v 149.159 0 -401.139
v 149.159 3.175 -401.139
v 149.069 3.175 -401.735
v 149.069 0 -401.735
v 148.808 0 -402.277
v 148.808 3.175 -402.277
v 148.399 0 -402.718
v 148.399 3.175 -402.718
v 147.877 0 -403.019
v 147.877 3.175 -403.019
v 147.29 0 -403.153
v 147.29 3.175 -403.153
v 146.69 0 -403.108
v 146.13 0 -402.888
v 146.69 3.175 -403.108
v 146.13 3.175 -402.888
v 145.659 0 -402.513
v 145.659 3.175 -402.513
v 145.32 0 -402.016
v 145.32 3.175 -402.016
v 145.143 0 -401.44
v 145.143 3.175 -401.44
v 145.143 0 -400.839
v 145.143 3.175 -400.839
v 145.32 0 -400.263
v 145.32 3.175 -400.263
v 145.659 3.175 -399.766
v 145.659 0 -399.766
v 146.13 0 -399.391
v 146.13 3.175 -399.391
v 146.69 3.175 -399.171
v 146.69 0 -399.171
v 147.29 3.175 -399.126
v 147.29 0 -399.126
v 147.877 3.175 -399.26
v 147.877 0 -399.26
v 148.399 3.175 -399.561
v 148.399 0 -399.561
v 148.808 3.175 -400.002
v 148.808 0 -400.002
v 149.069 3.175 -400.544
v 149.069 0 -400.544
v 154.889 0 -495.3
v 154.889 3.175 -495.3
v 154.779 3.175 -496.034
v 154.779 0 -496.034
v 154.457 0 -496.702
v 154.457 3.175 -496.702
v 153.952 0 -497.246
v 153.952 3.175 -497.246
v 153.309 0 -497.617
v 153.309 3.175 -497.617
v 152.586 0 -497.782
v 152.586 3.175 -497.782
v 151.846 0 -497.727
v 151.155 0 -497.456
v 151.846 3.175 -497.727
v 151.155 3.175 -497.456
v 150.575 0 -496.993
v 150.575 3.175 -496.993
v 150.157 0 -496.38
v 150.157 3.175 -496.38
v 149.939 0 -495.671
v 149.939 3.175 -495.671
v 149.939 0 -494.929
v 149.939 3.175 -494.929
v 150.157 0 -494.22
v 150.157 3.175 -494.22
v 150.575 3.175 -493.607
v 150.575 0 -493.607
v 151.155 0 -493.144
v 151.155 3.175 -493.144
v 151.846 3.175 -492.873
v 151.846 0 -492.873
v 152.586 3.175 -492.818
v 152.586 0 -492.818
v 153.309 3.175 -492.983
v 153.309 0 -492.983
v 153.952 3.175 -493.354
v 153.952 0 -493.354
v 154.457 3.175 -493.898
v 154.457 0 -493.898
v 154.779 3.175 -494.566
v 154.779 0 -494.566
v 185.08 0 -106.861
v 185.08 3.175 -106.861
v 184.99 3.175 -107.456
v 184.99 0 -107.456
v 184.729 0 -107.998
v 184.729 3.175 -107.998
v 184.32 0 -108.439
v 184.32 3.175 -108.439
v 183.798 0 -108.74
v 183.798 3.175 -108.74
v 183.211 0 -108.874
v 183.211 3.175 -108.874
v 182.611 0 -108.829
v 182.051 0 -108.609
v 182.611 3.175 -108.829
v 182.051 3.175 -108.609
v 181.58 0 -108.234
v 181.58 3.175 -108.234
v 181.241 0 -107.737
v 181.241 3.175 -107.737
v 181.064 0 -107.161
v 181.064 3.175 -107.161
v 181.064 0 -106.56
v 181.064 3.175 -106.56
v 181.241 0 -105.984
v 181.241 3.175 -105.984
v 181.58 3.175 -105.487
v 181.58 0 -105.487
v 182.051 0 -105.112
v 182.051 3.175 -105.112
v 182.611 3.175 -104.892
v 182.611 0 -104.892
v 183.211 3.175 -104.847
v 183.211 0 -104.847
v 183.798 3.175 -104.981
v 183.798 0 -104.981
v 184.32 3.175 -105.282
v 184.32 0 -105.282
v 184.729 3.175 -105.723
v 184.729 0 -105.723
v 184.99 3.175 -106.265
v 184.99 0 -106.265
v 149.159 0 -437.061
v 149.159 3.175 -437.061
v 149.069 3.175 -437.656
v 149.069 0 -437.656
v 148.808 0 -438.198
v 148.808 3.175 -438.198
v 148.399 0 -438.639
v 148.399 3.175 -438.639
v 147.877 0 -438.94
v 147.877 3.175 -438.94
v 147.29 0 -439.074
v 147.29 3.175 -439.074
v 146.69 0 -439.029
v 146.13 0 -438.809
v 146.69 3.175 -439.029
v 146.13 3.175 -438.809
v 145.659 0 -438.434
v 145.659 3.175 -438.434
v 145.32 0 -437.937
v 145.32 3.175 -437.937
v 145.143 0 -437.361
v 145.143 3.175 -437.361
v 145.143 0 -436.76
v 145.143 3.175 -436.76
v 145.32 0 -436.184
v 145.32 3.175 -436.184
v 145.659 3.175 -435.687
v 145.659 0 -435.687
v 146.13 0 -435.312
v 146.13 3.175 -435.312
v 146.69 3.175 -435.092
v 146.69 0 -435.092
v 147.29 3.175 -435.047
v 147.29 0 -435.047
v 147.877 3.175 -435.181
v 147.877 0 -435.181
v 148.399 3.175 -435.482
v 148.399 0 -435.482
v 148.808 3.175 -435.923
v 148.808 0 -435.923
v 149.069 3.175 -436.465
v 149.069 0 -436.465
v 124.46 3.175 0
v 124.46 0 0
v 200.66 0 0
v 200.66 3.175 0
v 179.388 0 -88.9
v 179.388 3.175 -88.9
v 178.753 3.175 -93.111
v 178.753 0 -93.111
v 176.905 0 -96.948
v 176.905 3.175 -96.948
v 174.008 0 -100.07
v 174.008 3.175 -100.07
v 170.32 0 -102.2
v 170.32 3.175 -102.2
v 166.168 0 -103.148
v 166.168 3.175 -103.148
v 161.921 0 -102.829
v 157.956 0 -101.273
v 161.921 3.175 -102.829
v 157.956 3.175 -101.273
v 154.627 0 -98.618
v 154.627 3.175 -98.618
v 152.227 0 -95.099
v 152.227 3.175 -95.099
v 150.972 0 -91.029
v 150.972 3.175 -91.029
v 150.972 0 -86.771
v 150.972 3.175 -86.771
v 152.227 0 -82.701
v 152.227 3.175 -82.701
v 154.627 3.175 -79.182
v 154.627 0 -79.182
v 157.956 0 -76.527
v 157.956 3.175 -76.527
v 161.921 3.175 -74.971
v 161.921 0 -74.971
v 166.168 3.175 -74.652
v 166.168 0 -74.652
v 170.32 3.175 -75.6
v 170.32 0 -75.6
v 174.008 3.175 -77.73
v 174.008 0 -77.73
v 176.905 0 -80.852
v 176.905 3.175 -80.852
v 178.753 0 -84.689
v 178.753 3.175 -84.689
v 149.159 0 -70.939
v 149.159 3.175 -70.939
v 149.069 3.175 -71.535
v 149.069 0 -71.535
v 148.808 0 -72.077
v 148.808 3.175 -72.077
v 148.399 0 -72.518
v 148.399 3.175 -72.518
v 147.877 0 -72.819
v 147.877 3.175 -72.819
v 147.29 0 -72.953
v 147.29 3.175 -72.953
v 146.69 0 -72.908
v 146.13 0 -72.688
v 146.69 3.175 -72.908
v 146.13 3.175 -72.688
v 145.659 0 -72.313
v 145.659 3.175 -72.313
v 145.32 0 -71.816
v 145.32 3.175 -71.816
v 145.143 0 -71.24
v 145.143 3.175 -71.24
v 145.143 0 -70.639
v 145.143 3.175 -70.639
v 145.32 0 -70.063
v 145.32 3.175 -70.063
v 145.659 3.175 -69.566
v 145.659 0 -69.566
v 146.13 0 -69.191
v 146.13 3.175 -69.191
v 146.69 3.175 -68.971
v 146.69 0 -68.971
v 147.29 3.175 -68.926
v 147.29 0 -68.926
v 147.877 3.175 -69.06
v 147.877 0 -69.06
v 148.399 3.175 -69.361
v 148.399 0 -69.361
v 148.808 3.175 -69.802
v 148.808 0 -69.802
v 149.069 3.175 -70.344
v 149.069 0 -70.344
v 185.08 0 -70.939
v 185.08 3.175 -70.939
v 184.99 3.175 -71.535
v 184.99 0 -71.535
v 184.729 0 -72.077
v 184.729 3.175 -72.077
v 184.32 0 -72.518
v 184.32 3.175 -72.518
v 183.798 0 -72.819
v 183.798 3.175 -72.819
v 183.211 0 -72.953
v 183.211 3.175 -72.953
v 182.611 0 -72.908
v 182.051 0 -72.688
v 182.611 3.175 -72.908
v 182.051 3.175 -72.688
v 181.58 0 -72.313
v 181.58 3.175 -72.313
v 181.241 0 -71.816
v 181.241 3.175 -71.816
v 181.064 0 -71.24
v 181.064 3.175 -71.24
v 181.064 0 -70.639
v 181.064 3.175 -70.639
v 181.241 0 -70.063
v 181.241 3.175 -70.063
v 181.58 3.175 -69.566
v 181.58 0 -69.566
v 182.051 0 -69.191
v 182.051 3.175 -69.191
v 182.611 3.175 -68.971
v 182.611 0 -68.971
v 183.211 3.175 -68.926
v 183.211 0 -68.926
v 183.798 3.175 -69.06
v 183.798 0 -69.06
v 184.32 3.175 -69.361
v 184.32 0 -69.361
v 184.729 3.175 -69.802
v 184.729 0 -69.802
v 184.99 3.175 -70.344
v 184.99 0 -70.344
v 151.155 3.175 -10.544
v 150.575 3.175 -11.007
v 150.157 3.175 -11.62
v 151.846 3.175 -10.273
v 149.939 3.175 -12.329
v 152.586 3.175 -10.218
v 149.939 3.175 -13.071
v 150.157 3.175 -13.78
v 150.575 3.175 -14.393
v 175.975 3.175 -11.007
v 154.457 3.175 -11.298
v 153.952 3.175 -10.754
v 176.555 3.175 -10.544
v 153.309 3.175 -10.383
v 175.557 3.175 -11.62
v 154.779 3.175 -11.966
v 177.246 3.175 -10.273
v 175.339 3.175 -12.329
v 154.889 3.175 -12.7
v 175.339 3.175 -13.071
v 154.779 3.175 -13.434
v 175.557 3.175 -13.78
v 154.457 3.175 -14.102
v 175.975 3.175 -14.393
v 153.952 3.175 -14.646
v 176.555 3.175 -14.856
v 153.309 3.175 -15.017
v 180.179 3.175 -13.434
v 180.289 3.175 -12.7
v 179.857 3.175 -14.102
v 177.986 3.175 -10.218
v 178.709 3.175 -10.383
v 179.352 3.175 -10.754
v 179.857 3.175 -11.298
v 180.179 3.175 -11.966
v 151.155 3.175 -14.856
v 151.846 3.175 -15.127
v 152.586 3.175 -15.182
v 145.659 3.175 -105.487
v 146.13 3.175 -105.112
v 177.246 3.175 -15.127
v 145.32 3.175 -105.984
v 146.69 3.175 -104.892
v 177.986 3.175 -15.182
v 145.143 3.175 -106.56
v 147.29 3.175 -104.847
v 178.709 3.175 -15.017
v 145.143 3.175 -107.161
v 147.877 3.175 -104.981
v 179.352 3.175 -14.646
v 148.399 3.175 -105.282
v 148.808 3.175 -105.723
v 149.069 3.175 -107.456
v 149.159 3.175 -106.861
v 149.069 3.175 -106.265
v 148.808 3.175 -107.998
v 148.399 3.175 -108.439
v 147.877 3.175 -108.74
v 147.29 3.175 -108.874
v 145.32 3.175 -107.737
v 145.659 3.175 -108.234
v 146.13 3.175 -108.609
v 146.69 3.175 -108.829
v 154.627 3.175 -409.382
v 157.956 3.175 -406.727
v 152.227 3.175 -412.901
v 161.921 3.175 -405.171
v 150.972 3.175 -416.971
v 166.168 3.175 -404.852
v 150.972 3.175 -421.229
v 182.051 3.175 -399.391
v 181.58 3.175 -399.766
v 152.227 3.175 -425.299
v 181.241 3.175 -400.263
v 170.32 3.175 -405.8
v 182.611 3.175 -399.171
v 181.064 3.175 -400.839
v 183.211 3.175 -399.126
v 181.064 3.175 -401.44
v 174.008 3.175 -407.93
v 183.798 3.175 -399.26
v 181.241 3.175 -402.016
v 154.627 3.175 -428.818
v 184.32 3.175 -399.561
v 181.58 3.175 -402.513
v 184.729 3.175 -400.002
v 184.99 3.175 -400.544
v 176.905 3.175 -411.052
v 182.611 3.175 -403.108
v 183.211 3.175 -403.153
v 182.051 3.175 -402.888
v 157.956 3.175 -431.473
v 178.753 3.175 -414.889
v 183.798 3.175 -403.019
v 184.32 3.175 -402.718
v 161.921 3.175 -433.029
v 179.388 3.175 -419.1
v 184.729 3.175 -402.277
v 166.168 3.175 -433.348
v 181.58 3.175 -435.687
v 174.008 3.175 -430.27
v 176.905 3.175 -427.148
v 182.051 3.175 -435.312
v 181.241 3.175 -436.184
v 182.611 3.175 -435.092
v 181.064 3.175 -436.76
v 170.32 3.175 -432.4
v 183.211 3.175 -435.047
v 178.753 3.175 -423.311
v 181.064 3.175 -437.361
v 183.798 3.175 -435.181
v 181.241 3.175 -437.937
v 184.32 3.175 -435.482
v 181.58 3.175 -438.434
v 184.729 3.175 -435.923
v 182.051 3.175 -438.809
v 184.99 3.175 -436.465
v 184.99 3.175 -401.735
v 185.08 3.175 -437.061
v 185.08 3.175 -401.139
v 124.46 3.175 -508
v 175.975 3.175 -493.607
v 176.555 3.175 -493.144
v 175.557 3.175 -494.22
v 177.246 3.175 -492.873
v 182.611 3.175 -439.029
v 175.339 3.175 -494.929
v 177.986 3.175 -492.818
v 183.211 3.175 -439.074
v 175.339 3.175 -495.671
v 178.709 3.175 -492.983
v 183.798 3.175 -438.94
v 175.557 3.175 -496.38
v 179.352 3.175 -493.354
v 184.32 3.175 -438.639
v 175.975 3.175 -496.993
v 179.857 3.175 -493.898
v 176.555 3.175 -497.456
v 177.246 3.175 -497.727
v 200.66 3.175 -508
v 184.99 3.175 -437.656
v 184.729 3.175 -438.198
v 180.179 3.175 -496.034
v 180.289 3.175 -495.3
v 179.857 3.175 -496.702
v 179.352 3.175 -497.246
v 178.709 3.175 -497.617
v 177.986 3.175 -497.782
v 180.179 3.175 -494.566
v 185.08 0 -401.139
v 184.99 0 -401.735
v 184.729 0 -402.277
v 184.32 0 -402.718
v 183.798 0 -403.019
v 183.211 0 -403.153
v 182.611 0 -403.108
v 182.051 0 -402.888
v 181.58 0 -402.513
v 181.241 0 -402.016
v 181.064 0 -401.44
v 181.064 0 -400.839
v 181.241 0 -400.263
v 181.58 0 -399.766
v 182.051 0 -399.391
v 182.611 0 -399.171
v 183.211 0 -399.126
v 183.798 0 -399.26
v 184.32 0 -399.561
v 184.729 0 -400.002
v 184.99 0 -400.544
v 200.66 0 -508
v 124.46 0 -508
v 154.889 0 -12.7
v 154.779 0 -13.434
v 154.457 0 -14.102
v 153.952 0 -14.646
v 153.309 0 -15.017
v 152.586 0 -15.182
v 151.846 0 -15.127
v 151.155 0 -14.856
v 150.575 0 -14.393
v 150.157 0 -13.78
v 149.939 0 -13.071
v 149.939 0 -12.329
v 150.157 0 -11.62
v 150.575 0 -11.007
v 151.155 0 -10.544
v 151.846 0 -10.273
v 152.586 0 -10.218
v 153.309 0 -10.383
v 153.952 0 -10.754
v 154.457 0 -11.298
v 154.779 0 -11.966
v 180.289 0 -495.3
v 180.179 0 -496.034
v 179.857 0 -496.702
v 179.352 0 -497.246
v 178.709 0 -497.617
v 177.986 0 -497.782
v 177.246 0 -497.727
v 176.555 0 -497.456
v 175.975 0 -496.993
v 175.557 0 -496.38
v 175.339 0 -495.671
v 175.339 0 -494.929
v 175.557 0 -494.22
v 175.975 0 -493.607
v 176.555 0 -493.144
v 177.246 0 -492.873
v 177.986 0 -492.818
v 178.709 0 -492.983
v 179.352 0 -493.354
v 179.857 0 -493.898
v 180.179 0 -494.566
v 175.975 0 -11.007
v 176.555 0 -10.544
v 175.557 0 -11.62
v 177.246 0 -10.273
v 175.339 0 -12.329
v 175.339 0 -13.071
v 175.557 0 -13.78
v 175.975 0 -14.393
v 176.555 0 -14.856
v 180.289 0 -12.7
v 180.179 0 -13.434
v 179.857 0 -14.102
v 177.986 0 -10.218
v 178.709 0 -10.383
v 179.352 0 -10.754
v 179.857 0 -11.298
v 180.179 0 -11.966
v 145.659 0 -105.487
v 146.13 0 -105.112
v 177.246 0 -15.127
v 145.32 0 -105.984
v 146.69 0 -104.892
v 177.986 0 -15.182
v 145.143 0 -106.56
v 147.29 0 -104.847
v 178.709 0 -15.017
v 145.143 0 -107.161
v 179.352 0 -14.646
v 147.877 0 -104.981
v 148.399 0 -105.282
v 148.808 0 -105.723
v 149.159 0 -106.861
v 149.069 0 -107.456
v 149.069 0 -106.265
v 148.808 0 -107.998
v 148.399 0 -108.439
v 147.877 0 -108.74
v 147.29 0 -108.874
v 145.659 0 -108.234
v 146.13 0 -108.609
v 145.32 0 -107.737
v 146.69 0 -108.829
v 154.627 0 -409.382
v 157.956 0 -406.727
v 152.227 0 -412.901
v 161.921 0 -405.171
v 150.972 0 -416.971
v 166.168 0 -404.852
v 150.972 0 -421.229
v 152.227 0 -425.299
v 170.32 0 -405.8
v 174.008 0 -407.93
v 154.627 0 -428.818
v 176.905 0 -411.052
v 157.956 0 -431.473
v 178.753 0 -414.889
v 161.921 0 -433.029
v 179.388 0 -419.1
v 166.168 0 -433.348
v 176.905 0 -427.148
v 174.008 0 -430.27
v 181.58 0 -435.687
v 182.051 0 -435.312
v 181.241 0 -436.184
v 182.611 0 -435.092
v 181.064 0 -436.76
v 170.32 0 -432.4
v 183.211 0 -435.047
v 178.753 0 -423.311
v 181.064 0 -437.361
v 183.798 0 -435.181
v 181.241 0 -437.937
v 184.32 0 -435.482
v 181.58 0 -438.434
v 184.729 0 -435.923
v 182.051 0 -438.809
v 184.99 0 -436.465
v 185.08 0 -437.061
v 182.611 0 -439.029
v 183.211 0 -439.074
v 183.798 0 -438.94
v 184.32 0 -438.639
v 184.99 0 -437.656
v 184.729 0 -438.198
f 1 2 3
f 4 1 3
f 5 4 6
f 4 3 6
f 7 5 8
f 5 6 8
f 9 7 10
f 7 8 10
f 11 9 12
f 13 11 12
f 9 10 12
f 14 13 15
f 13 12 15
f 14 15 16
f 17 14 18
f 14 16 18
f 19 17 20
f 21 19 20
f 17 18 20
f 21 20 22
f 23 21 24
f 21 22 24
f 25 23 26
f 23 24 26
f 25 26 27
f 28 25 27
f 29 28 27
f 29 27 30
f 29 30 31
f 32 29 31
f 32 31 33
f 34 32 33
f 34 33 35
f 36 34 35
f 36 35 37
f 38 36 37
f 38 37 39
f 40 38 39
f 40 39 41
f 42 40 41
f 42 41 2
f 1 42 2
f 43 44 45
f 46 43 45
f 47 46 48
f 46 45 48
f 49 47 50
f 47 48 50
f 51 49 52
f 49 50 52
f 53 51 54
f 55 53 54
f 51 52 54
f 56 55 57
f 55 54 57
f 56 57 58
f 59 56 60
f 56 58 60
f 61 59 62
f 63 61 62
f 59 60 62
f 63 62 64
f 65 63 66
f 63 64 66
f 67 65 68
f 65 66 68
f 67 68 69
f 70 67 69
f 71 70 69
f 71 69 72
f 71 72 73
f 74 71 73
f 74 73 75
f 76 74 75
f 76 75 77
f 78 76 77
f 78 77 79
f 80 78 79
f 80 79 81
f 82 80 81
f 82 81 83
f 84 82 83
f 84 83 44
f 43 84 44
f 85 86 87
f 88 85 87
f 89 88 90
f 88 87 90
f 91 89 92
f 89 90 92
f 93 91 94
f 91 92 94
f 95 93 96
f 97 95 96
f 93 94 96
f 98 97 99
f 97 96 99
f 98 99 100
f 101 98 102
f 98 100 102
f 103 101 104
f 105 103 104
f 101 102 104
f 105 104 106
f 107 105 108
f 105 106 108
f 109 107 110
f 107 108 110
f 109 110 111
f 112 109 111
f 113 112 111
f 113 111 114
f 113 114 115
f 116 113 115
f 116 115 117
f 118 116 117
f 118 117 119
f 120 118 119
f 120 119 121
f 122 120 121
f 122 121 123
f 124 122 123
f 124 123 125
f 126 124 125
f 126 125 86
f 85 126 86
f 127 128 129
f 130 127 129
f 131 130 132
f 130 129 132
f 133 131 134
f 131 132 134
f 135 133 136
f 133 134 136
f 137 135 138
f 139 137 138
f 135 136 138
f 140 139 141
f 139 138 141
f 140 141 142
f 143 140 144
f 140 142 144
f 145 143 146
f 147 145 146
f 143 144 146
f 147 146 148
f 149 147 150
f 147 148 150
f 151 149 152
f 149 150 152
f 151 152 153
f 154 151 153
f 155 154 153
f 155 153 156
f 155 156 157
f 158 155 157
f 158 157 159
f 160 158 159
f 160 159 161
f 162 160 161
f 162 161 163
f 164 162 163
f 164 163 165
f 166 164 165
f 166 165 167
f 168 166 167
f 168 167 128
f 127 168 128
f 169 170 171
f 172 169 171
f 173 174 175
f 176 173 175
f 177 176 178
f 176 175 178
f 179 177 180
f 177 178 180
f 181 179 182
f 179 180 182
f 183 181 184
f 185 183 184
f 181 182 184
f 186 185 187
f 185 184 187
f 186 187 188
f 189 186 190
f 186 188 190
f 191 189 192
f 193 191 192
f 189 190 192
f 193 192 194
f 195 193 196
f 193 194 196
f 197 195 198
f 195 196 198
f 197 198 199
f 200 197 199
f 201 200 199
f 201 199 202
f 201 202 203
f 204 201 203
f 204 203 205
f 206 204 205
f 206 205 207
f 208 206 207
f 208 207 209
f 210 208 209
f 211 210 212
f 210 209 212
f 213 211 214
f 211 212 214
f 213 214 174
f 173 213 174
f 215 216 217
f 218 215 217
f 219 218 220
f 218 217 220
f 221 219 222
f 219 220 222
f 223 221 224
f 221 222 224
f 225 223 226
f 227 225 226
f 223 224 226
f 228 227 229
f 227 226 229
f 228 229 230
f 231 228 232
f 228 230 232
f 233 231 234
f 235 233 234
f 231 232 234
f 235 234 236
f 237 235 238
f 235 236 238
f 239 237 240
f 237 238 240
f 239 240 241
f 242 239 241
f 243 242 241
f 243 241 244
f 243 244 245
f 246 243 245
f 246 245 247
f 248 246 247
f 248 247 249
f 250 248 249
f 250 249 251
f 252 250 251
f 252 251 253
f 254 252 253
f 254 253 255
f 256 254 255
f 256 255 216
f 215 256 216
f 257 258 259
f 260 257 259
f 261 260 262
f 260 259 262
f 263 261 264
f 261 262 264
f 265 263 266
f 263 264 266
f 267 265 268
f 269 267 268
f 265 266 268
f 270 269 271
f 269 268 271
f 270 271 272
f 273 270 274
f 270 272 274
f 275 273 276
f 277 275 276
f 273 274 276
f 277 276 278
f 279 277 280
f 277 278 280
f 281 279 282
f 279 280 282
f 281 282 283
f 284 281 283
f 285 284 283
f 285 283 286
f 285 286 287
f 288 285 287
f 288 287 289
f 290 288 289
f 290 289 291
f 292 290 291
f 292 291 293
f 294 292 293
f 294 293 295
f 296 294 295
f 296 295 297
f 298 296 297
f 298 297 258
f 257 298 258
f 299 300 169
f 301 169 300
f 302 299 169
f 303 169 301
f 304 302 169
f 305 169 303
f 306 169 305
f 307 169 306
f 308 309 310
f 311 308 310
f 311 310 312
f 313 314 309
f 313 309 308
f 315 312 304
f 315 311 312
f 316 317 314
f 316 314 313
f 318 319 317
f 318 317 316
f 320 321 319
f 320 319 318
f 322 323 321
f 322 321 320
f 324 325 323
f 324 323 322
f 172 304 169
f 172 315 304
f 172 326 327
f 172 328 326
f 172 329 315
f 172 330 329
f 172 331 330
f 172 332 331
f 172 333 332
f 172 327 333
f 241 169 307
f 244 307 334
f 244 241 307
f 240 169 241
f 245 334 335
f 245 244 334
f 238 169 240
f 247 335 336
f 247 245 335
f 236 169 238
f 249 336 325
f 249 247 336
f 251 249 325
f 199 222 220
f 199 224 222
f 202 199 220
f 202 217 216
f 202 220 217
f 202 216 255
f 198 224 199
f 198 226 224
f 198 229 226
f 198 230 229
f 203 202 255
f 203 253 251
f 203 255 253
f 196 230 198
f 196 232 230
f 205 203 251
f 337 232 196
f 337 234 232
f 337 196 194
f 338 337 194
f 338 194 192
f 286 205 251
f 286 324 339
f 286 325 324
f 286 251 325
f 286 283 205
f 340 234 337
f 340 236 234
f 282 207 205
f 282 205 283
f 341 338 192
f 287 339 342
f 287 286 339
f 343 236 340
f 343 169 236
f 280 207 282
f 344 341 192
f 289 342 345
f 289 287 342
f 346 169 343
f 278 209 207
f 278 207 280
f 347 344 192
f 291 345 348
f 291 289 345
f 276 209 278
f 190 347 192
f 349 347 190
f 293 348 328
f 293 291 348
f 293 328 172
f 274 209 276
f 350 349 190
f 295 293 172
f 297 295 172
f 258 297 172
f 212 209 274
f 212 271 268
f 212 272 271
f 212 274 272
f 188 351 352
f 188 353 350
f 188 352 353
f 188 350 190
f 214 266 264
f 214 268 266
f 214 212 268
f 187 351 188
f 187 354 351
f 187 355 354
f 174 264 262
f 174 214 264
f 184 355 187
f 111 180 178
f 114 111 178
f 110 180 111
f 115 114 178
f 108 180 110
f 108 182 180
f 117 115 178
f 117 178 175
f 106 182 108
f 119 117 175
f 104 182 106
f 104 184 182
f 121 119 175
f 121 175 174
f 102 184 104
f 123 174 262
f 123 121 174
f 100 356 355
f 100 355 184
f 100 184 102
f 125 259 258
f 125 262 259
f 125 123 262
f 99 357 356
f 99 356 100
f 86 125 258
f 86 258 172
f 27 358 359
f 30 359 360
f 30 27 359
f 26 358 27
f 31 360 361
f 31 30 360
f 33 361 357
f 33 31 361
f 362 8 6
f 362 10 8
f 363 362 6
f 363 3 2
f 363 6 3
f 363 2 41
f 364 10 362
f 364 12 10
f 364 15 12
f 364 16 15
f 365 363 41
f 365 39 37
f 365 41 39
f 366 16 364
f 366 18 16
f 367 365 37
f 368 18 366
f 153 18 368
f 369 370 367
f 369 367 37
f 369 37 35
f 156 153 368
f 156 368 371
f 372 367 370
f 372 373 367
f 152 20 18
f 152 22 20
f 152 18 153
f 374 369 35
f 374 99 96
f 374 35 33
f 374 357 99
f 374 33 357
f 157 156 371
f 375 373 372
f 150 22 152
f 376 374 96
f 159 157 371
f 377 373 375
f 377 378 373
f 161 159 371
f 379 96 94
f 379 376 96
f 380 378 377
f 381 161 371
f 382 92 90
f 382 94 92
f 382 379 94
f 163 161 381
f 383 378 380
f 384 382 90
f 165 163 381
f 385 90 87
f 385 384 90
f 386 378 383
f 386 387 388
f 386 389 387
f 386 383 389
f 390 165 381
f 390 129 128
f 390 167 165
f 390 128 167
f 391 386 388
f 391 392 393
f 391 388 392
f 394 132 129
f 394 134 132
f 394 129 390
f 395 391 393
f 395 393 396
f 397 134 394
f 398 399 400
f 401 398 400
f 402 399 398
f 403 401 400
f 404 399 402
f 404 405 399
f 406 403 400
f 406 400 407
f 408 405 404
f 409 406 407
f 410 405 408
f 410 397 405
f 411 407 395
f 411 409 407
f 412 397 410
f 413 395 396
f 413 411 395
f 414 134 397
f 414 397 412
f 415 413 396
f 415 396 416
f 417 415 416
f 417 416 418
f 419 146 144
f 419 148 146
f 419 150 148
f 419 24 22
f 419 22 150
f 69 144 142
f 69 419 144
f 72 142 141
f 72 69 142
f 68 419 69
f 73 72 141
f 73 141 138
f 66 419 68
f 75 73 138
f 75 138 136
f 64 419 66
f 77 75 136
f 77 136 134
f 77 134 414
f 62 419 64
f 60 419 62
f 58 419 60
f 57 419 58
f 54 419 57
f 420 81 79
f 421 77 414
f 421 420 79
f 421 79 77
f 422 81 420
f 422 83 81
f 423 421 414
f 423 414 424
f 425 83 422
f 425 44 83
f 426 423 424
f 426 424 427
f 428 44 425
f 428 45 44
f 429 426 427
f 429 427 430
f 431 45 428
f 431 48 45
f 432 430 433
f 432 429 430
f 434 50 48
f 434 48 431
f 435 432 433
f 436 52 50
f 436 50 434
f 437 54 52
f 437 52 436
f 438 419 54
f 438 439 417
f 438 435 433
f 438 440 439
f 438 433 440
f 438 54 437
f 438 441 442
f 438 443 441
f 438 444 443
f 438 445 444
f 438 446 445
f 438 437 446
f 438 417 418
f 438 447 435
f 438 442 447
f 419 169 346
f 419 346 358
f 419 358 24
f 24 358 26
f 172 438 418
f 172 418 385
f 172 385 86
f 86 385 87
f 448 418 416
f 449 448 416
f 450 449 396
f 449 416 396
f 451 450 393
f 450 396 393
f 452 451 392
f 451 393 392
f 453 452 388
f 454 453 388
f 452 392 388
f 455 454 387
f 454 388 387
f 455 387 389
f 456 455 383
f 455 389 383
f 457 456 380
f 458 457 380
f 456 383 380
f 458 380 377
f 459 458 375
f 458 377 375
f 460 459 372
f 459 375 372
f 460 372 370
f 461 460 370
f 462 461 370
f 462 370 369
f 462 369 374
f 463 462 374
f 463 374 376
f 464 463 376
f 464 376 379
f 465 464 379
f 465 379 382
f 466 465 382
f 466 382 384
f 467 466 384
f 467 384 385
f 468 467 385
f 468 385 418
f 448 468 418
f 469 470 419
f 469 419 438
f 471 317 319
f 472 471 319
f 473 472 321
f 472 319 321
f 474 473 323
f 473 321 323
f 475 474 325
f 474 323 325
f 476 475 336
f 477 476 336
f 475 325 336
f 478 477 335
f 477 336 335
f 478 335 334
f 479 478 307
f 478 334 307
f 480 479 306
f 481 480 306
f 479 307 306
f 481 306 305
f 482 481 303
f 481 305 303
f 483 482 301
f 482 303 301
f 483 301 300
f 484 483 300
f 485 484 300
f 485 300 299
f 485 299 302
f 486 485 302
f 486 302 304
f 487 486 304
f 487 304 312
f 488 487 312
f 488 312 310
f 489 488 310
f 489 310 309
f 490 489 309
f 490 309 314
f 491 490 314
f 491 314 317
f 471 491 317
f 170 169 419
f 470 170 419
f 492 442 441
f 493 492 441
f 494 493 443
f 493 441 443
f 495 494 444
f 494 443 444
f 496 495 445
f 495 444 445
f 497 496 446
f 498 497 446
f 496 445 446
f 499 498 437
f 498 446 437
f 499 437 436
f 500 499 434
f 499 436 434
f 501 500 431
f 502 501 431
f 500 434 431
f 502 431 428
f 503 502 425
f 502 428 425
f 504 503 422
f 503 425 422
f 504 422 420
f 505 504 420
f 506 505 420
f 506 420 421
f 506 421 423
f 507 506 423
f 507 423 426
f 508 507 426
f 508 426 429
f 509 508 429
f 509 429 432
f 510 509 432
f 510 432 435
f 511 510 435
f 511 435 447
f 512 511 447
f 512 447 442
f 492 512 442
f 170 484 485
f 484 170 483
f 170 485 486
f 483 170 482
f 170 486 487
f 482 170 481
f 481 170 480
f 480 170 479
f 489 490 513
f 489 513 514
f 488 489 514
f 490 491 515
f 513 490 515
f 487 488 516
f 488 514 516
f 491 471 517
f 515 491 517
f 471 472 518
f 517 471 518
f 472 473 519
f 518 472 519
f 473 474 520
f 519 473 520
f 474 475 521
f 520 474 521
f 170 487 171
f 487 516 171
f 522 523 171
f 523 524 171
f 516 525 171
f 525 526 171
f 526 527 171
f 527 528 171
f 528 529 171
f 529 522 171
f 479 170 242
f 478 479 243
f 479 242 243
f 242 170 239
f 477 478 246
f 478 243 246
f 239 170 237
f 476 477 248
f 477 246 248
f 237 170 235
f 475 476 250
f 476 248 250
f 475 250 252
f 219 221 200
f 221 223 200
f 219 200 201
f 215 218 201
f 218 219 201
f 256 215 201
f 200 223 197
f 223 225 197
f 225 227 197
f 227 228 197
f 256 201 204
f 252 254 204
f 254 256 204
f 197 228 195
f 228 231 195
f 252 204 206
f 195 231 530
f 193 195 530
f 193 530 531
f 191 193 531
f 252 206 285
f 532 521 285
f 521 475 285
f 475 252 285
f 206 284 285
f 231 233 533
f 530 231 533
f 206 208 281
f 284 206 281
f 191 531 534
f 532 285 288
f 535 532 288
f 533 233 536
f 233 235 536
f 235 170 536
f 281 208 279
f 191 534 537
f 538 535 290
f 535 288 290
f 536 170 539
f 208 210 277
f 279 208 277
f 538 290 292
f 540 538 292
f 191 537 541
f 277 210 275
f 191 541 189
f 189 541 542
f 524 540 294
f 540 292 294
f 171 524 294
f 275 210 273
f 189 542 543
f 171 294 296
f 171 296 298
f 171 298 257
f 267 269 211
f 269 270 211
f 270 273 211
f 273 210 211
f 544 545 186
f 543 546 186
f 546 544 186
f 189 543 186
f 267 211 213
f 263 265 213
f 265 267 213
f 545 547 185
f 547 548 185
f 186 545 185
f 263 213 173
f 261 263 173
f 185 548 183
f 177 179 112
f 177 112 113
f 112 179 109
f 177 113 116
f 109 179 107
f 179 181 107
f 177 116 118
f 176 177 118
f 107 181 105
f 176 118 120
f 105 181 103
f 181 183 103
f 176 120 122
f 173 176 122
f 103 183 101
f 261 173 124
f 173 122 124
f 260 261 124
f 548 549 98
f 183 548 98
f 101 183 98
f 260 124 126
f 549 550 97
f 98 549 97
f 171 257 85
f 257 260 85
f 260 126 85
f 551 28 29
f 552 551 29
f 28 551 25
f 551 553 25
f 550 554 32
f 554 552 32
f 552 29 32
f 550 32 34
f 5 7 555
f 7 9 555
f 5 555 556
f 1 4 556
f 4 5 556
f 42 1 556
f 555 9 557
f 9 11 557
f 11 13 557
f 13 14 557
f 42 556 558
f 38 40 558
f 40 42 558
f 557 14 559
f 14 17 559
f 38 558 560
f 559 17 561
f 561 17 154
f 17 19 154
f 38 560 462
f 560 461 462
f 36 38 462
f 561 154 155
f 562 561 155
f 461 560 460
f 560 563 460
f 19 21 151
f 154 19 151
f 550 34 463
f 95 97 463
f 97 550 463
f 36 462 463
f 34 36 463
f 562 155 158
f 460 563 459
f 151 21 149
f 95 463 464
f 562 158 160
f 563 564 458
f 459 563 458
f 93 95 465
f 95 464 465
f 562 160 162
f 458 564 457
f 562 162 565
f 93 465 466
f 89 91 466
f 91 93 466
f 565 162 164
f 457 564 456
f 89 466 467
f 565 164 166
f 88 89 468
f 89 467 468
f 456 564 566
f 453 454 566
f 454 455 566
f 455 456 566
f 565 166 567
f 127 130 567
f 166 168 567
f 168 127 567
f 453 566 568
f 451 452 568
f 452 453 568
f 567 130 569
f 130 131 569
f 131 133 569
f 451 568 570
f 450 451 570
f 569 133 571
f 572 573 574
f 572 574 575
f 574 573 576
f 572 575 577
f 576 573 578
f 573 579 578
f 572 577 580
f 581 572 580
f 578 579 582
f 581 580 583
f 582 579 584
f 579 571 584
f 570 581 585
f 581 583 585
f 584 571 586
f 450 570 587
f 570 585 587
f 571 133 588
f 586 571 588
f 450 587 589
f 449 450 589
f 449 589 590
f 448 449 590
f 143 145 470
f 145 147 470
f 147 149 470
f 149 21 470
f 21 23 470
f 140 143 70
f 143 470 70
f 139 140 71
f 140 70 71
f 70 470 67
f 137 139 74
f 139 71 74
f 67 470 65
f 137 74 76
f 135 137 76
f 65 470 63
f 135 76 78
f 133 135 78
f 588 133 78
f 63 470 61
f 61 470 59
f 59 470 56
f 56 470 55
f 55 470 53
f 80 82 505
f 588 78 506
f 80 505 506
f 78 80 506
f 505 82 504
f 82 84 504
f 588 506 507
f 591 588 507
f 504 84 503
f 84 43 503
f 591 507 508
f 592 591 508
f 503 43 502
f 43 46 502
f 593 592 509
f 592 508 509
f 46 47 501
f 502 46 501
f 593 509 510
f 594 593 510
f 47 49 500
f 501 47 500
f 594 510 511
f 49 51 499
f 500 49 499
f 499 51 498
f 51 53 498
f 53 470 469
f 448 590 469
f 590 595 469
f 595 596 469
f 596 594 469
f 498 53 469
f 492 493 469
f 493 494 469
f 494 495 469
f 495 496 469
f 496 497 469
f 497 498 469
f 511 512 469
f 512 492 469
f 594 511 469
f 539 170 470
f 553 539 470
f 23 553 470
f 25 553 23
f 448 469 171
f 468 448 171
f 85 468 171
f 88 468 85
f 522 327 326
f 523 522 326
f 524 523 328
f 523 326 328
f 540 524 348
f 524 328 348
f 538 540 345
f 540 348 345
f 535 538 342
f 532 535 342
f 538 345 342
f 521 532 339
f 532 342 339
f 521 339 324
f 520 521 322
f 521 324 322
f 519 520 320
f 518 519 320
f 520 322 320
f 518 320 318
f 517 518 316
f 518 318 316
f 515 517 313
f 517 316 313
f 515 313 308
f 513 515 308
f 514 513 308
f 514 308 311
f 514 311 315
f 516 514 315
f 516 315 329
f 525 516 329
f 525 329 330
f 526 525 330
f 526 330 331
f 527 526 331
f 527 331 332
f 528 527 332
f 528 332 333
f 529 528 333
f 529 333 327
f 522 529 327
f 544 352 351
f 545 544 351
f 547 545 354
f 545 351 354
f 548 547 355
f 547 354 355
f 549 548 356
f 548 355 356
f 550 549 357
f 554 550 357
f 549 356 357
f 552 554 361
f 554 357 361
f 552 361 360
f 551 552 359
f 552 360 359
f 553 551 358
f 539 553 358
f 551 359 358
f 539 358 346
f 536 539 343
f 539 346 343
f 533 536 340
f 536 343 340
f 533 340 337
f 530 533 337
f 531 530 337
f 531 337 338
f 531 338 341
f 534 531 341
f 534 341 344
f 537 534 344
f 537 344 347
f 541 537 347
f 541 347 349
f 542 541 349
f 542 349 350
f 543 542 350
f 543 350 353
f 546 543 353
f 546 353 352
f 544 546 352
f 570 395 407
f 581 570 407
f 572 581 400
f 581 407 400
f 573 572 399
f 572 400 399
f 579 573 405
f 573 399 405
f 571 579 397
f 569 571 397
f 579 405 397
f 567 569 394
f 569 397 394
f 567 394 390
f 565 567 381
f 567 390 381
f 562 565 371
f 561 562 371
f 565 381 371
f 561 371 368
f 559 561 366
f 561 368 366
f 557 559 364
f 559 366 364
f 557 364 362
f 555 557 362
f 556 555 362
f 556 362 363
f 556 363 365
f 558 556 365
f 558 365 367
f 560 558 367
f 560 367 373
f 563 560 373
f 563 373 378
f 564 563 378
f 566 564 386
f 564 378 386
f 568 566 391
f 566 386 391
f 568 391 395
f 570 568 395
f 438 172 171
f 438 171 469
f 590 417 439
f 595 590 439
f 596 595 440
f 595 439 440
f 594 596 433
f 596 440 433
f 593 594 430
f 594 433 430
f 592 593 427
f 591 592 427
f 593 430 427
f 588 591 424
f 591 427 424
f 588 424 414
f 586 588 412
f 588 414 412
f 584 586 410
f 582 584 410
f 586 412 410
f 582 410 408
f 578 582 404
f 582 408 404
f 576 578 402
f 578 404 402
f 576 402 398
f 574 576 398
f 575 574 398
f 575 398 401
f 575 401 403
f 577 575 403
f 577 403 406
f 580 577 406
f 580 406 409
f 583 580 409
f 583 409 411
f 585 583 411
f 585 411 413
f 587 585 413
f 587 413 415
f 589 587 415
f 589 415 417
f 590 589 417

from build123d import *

# Parameters (mm, degrees)
SKETCH1_W               = 406.4
SKETCH1_H               = 508
BOSS_EXTRUDE1_DEPTH     = 3.175
SKETCH2_R               = 14.2875
CUT_EXTRUDE1_DEPTH      = 3.175
SKETCH3_R               = 2.4892
CUT_EXTRUDE2_DEPTH      = 1
CUT_EXTRUDE2_DEPTH_BACK = 4.175
SKETCH4_R               = 2.0193
CUT_EXTRUDE3_DEPTH      = 1
CUT_EXTRUDE3_DEPTH_BACK = 4.175
CUT_EXTRUDE4_REACH      = 5.175
SKETCH5_W               = 124.46
SKETCH5_H               = 508
SKETCH5_W_2             = 205.74


with BuildPart() as part:
    # Sketch1 → Boss-Extrude1 (new body)
    with BuildSketch(Plane(origin=(0, 0, 0), x_dir=(1, 0, 0), z_dir=(0, 1, 0))):
        with Locations((203.2, 254)):
            Rectangle(SKETCH1_W, SKETCH1_H)
    extrude(amount=BOSS_EXTRUDE1_DEPTH)

    # Sketch2 → Cut-Extrude1 (cut)
    with BuildSketch(Plane(origin=(0, 3.175, 0), x_dir=(1, 0, 0), z_dir=(0, 1, 0))):
        with Locations((50.8, 419.1)):
            Circle(SKETCH2_R)
        with Locations((165.1, 419.1)):
            Circle(SKETCH2_R)
        with Locations((50.8, 88.9)):
            Circle(SKETCH2_R)
        with Locations((165.1, 88.9)):
            Circle(SKETCH2_R)
    extrude(amount=-CUT_EXTRUDE1_DEPTH, mode=Mode.SUBTRACT)

    # Sketch3 → Cut-Extrude2 (cut, two sides)
    with BuildSketch(Plane(origin=(0, 3.175, 0), x_dir=(1, 0, 0), z_dir=(0, 1, 0))) as cut_extrude2_sk:
        with Locations((38.1, 12.7)):
            Circle(SKETCH3_R)
        with Locations((63.5, 12.7)):
            Circle(SKETCH3_R)
        with Locations((152.4, 12.7)):
            Circle(SKETCH3_R)
        with Locations((177.8, 12.7)):
            Circle(SKETCH3_R)
        with Locations((203.2, 12.7)):
            Circle(SKETCH3_R)
        with Locations((228.6, 12.7)):
            Circle(SKETCH3_R)
        with Locations((254, 12.7)):
            Circle(SKETCH3_R)
        with Locations((279.4, 12.7)):
            Circle(SKETCH3_R)
        with Locations((304.8, 12.7)):
            Circle(SKETCH3_R)
        with Locations((330.2, 12.7)):
            Circle(SKETCH3_R)
        with Locations((355.6, 12.7)):
            Circle(SKETCH3_R)
        with Locations((381, 12.7)):
            Circle(SKETCH3_R)
        with Locations((381, 495.3)):
            Circle(SKETCH3_R)
        with Locations((355.6, 495.3)):
            Circle(SKETCH3_R)
        with Locations((330.2, 495.3)):
            Circle(SKETCH3_R)
        with Locations((304.8, 495.3)):
            Circle(SKETCH3_R)
        with Locations((279.4, 495.3)):
            Circle(SKETCH3_R)
        with Locations((254, 495.3)):
            Circle(SKETCH3_R)
        with Locations((228.6, 495.3)):
            Circle(SKETCH3_R)
        with Locations((203.2, 495.3)):
            Circle(SKETCH3_R)
        with Locations((177.8, 495.3)):
            Circle(SKETCH3_R)
        with Locations((152.4, 495.3)):
            Circle(SKETCH3_R)
        with Locations((63.5, 495.3)):
            Circle(SKETCH3_R)
        with Locations((38.1, 495.3)):
            Circle(SKETCH3_R)
        with Locations((101.6, 12.7)):
            Circle(SKETCH3_R)
    extrude(amount=CUT_EXTRUDE2_DEPTH, mode=Mode.SUBTRACT)
    extrude(cut_extrude2_sk.sketch, amount=-CUT_EXTRUDE2_DEPTH_BACK, mode=Mode.SUBTRACT)

    # Sketch4 → Cut-Extrude3 (cut, two sides)
    with BuildSketch(Plane(origin=(0, 3.175, 0), x_dir=(1, 0, 0), z_dir=(0, 1, 0))) as cut_extrude3_sk:
        with Locations((76.2, 419.1)):
            Circle(SKETCH4_R)
        with Locations((25.4, 419.1)):
            Circle(SKETCH4_R)
        with Locations((38.1, 441.097045256)):
            Circle(SKETCH4_R)
        with Locations((63.5, 441.097045256)):
            Circle(SKETCH4_R)
        with Locations((63.5, 397.102954744)):
            Circle(SKETCH4_R)
        with Locations((38.1, 397.102954744)):
            Circle(SKETCH4_R)
        with Locations((147.139487788, 437.060512212)):
            Circle(SKETCH4_R)
        with Locations((183.060512212, 437.060512212)):
            Circle(SKETCH4_R)
        with Locations((183.060512212, 401.139487788)):
            Circle(SKETCH4_R)
        with Locations((147.139487788, 401.139487788)):
            Circle(SKETCH4_R)
        with Locations((147.139487788, 106.860512212)):
            Circle(SKETCH4_R)
        with Locations((183.060512212, 106.860512212)):
            Circle(SKETCH4_R)
        with Locations((183.060512212, 70.939487788)):
            Circle(SKETCH4_R)
        with Locations((147.139487788, 70.939487788)):
            Circle(SKETCH4_R)
        with Locations((38.1, 110.897045256)):
            Circle(SKETCH4_R)
        with Locations((63.5, 110.897045256)):
            Circle(SKETCH4_R)
        with Locations((63.5, 66.902954744)):
            Circle(SKETCH4_R)
        with Locations((38.1, 66.902954744)):
            Circle(SKETCH4_R)
        with Locations((25.4, 88.9)):
            Circle(SKETCH4_R)
        with Locations((76.2, 88.9)):
            Circle(SKETCH4_R)
    extrude(amount=CUT_EXTRUDE3_DEPTH, mode=Mode.SUBTRACT)
    extrude(cut_extrude3_sk.sketch, amount=-CUT_EXTRUDE3_DEPTH_BACK, mode=Mode.SUBTRACT)

    # Sketch5 → Cut-Extrude4 (cut, up to next)
    with BuildSketch(Plane(origin=(0, 3.175, 0), x_dir=(1, 0, 0), z_dir=(0, 1, 0)), mode=Mode.PRIVATE) as cut_extrude4_sk1:
        with Locations((62.23, 254)):
            Rectangle(SKETCH5_W, SKETCH5_H)
    cut_extrude4_tool1 = extrude(cut_extrude4_sk1.sketch, amount=-CUT_EXTRUDE4_REACH, mode=Mode.PRIVATE) & part.part
    add(cut_extrude4_tool1.solids().sort_by_distance((62.23, 3.175, -254))[0], mode=Mode.SUBTRACT)
    # Sketch5 → Cut-Extrude4 (cut, up to next)
    with BuildSketch(Plane(origin=(0, 3.175, 0), x_dir=(1, 0, 0), z_dir=(0, 1, 0)), mode=Mode.PRIVATE) as cut_extrude4_sk2:
        with Locations((303.53, 254)):
            Rectangle(SKETCH5_W_2, SKETCH5_H)
    cut_extrude4_tool2 = extrude(cut_extrude4_sk2.sketch, amount=-CUT_EXTRUDE4_REACH, mode=Mode.PRIVATE) & part.part
    add(cut_extrude4_tool2.solids().sort_by_distance((303.53, 3.175, -254))[0], mode=Mode.SUBTRACT)


solid = part.part
